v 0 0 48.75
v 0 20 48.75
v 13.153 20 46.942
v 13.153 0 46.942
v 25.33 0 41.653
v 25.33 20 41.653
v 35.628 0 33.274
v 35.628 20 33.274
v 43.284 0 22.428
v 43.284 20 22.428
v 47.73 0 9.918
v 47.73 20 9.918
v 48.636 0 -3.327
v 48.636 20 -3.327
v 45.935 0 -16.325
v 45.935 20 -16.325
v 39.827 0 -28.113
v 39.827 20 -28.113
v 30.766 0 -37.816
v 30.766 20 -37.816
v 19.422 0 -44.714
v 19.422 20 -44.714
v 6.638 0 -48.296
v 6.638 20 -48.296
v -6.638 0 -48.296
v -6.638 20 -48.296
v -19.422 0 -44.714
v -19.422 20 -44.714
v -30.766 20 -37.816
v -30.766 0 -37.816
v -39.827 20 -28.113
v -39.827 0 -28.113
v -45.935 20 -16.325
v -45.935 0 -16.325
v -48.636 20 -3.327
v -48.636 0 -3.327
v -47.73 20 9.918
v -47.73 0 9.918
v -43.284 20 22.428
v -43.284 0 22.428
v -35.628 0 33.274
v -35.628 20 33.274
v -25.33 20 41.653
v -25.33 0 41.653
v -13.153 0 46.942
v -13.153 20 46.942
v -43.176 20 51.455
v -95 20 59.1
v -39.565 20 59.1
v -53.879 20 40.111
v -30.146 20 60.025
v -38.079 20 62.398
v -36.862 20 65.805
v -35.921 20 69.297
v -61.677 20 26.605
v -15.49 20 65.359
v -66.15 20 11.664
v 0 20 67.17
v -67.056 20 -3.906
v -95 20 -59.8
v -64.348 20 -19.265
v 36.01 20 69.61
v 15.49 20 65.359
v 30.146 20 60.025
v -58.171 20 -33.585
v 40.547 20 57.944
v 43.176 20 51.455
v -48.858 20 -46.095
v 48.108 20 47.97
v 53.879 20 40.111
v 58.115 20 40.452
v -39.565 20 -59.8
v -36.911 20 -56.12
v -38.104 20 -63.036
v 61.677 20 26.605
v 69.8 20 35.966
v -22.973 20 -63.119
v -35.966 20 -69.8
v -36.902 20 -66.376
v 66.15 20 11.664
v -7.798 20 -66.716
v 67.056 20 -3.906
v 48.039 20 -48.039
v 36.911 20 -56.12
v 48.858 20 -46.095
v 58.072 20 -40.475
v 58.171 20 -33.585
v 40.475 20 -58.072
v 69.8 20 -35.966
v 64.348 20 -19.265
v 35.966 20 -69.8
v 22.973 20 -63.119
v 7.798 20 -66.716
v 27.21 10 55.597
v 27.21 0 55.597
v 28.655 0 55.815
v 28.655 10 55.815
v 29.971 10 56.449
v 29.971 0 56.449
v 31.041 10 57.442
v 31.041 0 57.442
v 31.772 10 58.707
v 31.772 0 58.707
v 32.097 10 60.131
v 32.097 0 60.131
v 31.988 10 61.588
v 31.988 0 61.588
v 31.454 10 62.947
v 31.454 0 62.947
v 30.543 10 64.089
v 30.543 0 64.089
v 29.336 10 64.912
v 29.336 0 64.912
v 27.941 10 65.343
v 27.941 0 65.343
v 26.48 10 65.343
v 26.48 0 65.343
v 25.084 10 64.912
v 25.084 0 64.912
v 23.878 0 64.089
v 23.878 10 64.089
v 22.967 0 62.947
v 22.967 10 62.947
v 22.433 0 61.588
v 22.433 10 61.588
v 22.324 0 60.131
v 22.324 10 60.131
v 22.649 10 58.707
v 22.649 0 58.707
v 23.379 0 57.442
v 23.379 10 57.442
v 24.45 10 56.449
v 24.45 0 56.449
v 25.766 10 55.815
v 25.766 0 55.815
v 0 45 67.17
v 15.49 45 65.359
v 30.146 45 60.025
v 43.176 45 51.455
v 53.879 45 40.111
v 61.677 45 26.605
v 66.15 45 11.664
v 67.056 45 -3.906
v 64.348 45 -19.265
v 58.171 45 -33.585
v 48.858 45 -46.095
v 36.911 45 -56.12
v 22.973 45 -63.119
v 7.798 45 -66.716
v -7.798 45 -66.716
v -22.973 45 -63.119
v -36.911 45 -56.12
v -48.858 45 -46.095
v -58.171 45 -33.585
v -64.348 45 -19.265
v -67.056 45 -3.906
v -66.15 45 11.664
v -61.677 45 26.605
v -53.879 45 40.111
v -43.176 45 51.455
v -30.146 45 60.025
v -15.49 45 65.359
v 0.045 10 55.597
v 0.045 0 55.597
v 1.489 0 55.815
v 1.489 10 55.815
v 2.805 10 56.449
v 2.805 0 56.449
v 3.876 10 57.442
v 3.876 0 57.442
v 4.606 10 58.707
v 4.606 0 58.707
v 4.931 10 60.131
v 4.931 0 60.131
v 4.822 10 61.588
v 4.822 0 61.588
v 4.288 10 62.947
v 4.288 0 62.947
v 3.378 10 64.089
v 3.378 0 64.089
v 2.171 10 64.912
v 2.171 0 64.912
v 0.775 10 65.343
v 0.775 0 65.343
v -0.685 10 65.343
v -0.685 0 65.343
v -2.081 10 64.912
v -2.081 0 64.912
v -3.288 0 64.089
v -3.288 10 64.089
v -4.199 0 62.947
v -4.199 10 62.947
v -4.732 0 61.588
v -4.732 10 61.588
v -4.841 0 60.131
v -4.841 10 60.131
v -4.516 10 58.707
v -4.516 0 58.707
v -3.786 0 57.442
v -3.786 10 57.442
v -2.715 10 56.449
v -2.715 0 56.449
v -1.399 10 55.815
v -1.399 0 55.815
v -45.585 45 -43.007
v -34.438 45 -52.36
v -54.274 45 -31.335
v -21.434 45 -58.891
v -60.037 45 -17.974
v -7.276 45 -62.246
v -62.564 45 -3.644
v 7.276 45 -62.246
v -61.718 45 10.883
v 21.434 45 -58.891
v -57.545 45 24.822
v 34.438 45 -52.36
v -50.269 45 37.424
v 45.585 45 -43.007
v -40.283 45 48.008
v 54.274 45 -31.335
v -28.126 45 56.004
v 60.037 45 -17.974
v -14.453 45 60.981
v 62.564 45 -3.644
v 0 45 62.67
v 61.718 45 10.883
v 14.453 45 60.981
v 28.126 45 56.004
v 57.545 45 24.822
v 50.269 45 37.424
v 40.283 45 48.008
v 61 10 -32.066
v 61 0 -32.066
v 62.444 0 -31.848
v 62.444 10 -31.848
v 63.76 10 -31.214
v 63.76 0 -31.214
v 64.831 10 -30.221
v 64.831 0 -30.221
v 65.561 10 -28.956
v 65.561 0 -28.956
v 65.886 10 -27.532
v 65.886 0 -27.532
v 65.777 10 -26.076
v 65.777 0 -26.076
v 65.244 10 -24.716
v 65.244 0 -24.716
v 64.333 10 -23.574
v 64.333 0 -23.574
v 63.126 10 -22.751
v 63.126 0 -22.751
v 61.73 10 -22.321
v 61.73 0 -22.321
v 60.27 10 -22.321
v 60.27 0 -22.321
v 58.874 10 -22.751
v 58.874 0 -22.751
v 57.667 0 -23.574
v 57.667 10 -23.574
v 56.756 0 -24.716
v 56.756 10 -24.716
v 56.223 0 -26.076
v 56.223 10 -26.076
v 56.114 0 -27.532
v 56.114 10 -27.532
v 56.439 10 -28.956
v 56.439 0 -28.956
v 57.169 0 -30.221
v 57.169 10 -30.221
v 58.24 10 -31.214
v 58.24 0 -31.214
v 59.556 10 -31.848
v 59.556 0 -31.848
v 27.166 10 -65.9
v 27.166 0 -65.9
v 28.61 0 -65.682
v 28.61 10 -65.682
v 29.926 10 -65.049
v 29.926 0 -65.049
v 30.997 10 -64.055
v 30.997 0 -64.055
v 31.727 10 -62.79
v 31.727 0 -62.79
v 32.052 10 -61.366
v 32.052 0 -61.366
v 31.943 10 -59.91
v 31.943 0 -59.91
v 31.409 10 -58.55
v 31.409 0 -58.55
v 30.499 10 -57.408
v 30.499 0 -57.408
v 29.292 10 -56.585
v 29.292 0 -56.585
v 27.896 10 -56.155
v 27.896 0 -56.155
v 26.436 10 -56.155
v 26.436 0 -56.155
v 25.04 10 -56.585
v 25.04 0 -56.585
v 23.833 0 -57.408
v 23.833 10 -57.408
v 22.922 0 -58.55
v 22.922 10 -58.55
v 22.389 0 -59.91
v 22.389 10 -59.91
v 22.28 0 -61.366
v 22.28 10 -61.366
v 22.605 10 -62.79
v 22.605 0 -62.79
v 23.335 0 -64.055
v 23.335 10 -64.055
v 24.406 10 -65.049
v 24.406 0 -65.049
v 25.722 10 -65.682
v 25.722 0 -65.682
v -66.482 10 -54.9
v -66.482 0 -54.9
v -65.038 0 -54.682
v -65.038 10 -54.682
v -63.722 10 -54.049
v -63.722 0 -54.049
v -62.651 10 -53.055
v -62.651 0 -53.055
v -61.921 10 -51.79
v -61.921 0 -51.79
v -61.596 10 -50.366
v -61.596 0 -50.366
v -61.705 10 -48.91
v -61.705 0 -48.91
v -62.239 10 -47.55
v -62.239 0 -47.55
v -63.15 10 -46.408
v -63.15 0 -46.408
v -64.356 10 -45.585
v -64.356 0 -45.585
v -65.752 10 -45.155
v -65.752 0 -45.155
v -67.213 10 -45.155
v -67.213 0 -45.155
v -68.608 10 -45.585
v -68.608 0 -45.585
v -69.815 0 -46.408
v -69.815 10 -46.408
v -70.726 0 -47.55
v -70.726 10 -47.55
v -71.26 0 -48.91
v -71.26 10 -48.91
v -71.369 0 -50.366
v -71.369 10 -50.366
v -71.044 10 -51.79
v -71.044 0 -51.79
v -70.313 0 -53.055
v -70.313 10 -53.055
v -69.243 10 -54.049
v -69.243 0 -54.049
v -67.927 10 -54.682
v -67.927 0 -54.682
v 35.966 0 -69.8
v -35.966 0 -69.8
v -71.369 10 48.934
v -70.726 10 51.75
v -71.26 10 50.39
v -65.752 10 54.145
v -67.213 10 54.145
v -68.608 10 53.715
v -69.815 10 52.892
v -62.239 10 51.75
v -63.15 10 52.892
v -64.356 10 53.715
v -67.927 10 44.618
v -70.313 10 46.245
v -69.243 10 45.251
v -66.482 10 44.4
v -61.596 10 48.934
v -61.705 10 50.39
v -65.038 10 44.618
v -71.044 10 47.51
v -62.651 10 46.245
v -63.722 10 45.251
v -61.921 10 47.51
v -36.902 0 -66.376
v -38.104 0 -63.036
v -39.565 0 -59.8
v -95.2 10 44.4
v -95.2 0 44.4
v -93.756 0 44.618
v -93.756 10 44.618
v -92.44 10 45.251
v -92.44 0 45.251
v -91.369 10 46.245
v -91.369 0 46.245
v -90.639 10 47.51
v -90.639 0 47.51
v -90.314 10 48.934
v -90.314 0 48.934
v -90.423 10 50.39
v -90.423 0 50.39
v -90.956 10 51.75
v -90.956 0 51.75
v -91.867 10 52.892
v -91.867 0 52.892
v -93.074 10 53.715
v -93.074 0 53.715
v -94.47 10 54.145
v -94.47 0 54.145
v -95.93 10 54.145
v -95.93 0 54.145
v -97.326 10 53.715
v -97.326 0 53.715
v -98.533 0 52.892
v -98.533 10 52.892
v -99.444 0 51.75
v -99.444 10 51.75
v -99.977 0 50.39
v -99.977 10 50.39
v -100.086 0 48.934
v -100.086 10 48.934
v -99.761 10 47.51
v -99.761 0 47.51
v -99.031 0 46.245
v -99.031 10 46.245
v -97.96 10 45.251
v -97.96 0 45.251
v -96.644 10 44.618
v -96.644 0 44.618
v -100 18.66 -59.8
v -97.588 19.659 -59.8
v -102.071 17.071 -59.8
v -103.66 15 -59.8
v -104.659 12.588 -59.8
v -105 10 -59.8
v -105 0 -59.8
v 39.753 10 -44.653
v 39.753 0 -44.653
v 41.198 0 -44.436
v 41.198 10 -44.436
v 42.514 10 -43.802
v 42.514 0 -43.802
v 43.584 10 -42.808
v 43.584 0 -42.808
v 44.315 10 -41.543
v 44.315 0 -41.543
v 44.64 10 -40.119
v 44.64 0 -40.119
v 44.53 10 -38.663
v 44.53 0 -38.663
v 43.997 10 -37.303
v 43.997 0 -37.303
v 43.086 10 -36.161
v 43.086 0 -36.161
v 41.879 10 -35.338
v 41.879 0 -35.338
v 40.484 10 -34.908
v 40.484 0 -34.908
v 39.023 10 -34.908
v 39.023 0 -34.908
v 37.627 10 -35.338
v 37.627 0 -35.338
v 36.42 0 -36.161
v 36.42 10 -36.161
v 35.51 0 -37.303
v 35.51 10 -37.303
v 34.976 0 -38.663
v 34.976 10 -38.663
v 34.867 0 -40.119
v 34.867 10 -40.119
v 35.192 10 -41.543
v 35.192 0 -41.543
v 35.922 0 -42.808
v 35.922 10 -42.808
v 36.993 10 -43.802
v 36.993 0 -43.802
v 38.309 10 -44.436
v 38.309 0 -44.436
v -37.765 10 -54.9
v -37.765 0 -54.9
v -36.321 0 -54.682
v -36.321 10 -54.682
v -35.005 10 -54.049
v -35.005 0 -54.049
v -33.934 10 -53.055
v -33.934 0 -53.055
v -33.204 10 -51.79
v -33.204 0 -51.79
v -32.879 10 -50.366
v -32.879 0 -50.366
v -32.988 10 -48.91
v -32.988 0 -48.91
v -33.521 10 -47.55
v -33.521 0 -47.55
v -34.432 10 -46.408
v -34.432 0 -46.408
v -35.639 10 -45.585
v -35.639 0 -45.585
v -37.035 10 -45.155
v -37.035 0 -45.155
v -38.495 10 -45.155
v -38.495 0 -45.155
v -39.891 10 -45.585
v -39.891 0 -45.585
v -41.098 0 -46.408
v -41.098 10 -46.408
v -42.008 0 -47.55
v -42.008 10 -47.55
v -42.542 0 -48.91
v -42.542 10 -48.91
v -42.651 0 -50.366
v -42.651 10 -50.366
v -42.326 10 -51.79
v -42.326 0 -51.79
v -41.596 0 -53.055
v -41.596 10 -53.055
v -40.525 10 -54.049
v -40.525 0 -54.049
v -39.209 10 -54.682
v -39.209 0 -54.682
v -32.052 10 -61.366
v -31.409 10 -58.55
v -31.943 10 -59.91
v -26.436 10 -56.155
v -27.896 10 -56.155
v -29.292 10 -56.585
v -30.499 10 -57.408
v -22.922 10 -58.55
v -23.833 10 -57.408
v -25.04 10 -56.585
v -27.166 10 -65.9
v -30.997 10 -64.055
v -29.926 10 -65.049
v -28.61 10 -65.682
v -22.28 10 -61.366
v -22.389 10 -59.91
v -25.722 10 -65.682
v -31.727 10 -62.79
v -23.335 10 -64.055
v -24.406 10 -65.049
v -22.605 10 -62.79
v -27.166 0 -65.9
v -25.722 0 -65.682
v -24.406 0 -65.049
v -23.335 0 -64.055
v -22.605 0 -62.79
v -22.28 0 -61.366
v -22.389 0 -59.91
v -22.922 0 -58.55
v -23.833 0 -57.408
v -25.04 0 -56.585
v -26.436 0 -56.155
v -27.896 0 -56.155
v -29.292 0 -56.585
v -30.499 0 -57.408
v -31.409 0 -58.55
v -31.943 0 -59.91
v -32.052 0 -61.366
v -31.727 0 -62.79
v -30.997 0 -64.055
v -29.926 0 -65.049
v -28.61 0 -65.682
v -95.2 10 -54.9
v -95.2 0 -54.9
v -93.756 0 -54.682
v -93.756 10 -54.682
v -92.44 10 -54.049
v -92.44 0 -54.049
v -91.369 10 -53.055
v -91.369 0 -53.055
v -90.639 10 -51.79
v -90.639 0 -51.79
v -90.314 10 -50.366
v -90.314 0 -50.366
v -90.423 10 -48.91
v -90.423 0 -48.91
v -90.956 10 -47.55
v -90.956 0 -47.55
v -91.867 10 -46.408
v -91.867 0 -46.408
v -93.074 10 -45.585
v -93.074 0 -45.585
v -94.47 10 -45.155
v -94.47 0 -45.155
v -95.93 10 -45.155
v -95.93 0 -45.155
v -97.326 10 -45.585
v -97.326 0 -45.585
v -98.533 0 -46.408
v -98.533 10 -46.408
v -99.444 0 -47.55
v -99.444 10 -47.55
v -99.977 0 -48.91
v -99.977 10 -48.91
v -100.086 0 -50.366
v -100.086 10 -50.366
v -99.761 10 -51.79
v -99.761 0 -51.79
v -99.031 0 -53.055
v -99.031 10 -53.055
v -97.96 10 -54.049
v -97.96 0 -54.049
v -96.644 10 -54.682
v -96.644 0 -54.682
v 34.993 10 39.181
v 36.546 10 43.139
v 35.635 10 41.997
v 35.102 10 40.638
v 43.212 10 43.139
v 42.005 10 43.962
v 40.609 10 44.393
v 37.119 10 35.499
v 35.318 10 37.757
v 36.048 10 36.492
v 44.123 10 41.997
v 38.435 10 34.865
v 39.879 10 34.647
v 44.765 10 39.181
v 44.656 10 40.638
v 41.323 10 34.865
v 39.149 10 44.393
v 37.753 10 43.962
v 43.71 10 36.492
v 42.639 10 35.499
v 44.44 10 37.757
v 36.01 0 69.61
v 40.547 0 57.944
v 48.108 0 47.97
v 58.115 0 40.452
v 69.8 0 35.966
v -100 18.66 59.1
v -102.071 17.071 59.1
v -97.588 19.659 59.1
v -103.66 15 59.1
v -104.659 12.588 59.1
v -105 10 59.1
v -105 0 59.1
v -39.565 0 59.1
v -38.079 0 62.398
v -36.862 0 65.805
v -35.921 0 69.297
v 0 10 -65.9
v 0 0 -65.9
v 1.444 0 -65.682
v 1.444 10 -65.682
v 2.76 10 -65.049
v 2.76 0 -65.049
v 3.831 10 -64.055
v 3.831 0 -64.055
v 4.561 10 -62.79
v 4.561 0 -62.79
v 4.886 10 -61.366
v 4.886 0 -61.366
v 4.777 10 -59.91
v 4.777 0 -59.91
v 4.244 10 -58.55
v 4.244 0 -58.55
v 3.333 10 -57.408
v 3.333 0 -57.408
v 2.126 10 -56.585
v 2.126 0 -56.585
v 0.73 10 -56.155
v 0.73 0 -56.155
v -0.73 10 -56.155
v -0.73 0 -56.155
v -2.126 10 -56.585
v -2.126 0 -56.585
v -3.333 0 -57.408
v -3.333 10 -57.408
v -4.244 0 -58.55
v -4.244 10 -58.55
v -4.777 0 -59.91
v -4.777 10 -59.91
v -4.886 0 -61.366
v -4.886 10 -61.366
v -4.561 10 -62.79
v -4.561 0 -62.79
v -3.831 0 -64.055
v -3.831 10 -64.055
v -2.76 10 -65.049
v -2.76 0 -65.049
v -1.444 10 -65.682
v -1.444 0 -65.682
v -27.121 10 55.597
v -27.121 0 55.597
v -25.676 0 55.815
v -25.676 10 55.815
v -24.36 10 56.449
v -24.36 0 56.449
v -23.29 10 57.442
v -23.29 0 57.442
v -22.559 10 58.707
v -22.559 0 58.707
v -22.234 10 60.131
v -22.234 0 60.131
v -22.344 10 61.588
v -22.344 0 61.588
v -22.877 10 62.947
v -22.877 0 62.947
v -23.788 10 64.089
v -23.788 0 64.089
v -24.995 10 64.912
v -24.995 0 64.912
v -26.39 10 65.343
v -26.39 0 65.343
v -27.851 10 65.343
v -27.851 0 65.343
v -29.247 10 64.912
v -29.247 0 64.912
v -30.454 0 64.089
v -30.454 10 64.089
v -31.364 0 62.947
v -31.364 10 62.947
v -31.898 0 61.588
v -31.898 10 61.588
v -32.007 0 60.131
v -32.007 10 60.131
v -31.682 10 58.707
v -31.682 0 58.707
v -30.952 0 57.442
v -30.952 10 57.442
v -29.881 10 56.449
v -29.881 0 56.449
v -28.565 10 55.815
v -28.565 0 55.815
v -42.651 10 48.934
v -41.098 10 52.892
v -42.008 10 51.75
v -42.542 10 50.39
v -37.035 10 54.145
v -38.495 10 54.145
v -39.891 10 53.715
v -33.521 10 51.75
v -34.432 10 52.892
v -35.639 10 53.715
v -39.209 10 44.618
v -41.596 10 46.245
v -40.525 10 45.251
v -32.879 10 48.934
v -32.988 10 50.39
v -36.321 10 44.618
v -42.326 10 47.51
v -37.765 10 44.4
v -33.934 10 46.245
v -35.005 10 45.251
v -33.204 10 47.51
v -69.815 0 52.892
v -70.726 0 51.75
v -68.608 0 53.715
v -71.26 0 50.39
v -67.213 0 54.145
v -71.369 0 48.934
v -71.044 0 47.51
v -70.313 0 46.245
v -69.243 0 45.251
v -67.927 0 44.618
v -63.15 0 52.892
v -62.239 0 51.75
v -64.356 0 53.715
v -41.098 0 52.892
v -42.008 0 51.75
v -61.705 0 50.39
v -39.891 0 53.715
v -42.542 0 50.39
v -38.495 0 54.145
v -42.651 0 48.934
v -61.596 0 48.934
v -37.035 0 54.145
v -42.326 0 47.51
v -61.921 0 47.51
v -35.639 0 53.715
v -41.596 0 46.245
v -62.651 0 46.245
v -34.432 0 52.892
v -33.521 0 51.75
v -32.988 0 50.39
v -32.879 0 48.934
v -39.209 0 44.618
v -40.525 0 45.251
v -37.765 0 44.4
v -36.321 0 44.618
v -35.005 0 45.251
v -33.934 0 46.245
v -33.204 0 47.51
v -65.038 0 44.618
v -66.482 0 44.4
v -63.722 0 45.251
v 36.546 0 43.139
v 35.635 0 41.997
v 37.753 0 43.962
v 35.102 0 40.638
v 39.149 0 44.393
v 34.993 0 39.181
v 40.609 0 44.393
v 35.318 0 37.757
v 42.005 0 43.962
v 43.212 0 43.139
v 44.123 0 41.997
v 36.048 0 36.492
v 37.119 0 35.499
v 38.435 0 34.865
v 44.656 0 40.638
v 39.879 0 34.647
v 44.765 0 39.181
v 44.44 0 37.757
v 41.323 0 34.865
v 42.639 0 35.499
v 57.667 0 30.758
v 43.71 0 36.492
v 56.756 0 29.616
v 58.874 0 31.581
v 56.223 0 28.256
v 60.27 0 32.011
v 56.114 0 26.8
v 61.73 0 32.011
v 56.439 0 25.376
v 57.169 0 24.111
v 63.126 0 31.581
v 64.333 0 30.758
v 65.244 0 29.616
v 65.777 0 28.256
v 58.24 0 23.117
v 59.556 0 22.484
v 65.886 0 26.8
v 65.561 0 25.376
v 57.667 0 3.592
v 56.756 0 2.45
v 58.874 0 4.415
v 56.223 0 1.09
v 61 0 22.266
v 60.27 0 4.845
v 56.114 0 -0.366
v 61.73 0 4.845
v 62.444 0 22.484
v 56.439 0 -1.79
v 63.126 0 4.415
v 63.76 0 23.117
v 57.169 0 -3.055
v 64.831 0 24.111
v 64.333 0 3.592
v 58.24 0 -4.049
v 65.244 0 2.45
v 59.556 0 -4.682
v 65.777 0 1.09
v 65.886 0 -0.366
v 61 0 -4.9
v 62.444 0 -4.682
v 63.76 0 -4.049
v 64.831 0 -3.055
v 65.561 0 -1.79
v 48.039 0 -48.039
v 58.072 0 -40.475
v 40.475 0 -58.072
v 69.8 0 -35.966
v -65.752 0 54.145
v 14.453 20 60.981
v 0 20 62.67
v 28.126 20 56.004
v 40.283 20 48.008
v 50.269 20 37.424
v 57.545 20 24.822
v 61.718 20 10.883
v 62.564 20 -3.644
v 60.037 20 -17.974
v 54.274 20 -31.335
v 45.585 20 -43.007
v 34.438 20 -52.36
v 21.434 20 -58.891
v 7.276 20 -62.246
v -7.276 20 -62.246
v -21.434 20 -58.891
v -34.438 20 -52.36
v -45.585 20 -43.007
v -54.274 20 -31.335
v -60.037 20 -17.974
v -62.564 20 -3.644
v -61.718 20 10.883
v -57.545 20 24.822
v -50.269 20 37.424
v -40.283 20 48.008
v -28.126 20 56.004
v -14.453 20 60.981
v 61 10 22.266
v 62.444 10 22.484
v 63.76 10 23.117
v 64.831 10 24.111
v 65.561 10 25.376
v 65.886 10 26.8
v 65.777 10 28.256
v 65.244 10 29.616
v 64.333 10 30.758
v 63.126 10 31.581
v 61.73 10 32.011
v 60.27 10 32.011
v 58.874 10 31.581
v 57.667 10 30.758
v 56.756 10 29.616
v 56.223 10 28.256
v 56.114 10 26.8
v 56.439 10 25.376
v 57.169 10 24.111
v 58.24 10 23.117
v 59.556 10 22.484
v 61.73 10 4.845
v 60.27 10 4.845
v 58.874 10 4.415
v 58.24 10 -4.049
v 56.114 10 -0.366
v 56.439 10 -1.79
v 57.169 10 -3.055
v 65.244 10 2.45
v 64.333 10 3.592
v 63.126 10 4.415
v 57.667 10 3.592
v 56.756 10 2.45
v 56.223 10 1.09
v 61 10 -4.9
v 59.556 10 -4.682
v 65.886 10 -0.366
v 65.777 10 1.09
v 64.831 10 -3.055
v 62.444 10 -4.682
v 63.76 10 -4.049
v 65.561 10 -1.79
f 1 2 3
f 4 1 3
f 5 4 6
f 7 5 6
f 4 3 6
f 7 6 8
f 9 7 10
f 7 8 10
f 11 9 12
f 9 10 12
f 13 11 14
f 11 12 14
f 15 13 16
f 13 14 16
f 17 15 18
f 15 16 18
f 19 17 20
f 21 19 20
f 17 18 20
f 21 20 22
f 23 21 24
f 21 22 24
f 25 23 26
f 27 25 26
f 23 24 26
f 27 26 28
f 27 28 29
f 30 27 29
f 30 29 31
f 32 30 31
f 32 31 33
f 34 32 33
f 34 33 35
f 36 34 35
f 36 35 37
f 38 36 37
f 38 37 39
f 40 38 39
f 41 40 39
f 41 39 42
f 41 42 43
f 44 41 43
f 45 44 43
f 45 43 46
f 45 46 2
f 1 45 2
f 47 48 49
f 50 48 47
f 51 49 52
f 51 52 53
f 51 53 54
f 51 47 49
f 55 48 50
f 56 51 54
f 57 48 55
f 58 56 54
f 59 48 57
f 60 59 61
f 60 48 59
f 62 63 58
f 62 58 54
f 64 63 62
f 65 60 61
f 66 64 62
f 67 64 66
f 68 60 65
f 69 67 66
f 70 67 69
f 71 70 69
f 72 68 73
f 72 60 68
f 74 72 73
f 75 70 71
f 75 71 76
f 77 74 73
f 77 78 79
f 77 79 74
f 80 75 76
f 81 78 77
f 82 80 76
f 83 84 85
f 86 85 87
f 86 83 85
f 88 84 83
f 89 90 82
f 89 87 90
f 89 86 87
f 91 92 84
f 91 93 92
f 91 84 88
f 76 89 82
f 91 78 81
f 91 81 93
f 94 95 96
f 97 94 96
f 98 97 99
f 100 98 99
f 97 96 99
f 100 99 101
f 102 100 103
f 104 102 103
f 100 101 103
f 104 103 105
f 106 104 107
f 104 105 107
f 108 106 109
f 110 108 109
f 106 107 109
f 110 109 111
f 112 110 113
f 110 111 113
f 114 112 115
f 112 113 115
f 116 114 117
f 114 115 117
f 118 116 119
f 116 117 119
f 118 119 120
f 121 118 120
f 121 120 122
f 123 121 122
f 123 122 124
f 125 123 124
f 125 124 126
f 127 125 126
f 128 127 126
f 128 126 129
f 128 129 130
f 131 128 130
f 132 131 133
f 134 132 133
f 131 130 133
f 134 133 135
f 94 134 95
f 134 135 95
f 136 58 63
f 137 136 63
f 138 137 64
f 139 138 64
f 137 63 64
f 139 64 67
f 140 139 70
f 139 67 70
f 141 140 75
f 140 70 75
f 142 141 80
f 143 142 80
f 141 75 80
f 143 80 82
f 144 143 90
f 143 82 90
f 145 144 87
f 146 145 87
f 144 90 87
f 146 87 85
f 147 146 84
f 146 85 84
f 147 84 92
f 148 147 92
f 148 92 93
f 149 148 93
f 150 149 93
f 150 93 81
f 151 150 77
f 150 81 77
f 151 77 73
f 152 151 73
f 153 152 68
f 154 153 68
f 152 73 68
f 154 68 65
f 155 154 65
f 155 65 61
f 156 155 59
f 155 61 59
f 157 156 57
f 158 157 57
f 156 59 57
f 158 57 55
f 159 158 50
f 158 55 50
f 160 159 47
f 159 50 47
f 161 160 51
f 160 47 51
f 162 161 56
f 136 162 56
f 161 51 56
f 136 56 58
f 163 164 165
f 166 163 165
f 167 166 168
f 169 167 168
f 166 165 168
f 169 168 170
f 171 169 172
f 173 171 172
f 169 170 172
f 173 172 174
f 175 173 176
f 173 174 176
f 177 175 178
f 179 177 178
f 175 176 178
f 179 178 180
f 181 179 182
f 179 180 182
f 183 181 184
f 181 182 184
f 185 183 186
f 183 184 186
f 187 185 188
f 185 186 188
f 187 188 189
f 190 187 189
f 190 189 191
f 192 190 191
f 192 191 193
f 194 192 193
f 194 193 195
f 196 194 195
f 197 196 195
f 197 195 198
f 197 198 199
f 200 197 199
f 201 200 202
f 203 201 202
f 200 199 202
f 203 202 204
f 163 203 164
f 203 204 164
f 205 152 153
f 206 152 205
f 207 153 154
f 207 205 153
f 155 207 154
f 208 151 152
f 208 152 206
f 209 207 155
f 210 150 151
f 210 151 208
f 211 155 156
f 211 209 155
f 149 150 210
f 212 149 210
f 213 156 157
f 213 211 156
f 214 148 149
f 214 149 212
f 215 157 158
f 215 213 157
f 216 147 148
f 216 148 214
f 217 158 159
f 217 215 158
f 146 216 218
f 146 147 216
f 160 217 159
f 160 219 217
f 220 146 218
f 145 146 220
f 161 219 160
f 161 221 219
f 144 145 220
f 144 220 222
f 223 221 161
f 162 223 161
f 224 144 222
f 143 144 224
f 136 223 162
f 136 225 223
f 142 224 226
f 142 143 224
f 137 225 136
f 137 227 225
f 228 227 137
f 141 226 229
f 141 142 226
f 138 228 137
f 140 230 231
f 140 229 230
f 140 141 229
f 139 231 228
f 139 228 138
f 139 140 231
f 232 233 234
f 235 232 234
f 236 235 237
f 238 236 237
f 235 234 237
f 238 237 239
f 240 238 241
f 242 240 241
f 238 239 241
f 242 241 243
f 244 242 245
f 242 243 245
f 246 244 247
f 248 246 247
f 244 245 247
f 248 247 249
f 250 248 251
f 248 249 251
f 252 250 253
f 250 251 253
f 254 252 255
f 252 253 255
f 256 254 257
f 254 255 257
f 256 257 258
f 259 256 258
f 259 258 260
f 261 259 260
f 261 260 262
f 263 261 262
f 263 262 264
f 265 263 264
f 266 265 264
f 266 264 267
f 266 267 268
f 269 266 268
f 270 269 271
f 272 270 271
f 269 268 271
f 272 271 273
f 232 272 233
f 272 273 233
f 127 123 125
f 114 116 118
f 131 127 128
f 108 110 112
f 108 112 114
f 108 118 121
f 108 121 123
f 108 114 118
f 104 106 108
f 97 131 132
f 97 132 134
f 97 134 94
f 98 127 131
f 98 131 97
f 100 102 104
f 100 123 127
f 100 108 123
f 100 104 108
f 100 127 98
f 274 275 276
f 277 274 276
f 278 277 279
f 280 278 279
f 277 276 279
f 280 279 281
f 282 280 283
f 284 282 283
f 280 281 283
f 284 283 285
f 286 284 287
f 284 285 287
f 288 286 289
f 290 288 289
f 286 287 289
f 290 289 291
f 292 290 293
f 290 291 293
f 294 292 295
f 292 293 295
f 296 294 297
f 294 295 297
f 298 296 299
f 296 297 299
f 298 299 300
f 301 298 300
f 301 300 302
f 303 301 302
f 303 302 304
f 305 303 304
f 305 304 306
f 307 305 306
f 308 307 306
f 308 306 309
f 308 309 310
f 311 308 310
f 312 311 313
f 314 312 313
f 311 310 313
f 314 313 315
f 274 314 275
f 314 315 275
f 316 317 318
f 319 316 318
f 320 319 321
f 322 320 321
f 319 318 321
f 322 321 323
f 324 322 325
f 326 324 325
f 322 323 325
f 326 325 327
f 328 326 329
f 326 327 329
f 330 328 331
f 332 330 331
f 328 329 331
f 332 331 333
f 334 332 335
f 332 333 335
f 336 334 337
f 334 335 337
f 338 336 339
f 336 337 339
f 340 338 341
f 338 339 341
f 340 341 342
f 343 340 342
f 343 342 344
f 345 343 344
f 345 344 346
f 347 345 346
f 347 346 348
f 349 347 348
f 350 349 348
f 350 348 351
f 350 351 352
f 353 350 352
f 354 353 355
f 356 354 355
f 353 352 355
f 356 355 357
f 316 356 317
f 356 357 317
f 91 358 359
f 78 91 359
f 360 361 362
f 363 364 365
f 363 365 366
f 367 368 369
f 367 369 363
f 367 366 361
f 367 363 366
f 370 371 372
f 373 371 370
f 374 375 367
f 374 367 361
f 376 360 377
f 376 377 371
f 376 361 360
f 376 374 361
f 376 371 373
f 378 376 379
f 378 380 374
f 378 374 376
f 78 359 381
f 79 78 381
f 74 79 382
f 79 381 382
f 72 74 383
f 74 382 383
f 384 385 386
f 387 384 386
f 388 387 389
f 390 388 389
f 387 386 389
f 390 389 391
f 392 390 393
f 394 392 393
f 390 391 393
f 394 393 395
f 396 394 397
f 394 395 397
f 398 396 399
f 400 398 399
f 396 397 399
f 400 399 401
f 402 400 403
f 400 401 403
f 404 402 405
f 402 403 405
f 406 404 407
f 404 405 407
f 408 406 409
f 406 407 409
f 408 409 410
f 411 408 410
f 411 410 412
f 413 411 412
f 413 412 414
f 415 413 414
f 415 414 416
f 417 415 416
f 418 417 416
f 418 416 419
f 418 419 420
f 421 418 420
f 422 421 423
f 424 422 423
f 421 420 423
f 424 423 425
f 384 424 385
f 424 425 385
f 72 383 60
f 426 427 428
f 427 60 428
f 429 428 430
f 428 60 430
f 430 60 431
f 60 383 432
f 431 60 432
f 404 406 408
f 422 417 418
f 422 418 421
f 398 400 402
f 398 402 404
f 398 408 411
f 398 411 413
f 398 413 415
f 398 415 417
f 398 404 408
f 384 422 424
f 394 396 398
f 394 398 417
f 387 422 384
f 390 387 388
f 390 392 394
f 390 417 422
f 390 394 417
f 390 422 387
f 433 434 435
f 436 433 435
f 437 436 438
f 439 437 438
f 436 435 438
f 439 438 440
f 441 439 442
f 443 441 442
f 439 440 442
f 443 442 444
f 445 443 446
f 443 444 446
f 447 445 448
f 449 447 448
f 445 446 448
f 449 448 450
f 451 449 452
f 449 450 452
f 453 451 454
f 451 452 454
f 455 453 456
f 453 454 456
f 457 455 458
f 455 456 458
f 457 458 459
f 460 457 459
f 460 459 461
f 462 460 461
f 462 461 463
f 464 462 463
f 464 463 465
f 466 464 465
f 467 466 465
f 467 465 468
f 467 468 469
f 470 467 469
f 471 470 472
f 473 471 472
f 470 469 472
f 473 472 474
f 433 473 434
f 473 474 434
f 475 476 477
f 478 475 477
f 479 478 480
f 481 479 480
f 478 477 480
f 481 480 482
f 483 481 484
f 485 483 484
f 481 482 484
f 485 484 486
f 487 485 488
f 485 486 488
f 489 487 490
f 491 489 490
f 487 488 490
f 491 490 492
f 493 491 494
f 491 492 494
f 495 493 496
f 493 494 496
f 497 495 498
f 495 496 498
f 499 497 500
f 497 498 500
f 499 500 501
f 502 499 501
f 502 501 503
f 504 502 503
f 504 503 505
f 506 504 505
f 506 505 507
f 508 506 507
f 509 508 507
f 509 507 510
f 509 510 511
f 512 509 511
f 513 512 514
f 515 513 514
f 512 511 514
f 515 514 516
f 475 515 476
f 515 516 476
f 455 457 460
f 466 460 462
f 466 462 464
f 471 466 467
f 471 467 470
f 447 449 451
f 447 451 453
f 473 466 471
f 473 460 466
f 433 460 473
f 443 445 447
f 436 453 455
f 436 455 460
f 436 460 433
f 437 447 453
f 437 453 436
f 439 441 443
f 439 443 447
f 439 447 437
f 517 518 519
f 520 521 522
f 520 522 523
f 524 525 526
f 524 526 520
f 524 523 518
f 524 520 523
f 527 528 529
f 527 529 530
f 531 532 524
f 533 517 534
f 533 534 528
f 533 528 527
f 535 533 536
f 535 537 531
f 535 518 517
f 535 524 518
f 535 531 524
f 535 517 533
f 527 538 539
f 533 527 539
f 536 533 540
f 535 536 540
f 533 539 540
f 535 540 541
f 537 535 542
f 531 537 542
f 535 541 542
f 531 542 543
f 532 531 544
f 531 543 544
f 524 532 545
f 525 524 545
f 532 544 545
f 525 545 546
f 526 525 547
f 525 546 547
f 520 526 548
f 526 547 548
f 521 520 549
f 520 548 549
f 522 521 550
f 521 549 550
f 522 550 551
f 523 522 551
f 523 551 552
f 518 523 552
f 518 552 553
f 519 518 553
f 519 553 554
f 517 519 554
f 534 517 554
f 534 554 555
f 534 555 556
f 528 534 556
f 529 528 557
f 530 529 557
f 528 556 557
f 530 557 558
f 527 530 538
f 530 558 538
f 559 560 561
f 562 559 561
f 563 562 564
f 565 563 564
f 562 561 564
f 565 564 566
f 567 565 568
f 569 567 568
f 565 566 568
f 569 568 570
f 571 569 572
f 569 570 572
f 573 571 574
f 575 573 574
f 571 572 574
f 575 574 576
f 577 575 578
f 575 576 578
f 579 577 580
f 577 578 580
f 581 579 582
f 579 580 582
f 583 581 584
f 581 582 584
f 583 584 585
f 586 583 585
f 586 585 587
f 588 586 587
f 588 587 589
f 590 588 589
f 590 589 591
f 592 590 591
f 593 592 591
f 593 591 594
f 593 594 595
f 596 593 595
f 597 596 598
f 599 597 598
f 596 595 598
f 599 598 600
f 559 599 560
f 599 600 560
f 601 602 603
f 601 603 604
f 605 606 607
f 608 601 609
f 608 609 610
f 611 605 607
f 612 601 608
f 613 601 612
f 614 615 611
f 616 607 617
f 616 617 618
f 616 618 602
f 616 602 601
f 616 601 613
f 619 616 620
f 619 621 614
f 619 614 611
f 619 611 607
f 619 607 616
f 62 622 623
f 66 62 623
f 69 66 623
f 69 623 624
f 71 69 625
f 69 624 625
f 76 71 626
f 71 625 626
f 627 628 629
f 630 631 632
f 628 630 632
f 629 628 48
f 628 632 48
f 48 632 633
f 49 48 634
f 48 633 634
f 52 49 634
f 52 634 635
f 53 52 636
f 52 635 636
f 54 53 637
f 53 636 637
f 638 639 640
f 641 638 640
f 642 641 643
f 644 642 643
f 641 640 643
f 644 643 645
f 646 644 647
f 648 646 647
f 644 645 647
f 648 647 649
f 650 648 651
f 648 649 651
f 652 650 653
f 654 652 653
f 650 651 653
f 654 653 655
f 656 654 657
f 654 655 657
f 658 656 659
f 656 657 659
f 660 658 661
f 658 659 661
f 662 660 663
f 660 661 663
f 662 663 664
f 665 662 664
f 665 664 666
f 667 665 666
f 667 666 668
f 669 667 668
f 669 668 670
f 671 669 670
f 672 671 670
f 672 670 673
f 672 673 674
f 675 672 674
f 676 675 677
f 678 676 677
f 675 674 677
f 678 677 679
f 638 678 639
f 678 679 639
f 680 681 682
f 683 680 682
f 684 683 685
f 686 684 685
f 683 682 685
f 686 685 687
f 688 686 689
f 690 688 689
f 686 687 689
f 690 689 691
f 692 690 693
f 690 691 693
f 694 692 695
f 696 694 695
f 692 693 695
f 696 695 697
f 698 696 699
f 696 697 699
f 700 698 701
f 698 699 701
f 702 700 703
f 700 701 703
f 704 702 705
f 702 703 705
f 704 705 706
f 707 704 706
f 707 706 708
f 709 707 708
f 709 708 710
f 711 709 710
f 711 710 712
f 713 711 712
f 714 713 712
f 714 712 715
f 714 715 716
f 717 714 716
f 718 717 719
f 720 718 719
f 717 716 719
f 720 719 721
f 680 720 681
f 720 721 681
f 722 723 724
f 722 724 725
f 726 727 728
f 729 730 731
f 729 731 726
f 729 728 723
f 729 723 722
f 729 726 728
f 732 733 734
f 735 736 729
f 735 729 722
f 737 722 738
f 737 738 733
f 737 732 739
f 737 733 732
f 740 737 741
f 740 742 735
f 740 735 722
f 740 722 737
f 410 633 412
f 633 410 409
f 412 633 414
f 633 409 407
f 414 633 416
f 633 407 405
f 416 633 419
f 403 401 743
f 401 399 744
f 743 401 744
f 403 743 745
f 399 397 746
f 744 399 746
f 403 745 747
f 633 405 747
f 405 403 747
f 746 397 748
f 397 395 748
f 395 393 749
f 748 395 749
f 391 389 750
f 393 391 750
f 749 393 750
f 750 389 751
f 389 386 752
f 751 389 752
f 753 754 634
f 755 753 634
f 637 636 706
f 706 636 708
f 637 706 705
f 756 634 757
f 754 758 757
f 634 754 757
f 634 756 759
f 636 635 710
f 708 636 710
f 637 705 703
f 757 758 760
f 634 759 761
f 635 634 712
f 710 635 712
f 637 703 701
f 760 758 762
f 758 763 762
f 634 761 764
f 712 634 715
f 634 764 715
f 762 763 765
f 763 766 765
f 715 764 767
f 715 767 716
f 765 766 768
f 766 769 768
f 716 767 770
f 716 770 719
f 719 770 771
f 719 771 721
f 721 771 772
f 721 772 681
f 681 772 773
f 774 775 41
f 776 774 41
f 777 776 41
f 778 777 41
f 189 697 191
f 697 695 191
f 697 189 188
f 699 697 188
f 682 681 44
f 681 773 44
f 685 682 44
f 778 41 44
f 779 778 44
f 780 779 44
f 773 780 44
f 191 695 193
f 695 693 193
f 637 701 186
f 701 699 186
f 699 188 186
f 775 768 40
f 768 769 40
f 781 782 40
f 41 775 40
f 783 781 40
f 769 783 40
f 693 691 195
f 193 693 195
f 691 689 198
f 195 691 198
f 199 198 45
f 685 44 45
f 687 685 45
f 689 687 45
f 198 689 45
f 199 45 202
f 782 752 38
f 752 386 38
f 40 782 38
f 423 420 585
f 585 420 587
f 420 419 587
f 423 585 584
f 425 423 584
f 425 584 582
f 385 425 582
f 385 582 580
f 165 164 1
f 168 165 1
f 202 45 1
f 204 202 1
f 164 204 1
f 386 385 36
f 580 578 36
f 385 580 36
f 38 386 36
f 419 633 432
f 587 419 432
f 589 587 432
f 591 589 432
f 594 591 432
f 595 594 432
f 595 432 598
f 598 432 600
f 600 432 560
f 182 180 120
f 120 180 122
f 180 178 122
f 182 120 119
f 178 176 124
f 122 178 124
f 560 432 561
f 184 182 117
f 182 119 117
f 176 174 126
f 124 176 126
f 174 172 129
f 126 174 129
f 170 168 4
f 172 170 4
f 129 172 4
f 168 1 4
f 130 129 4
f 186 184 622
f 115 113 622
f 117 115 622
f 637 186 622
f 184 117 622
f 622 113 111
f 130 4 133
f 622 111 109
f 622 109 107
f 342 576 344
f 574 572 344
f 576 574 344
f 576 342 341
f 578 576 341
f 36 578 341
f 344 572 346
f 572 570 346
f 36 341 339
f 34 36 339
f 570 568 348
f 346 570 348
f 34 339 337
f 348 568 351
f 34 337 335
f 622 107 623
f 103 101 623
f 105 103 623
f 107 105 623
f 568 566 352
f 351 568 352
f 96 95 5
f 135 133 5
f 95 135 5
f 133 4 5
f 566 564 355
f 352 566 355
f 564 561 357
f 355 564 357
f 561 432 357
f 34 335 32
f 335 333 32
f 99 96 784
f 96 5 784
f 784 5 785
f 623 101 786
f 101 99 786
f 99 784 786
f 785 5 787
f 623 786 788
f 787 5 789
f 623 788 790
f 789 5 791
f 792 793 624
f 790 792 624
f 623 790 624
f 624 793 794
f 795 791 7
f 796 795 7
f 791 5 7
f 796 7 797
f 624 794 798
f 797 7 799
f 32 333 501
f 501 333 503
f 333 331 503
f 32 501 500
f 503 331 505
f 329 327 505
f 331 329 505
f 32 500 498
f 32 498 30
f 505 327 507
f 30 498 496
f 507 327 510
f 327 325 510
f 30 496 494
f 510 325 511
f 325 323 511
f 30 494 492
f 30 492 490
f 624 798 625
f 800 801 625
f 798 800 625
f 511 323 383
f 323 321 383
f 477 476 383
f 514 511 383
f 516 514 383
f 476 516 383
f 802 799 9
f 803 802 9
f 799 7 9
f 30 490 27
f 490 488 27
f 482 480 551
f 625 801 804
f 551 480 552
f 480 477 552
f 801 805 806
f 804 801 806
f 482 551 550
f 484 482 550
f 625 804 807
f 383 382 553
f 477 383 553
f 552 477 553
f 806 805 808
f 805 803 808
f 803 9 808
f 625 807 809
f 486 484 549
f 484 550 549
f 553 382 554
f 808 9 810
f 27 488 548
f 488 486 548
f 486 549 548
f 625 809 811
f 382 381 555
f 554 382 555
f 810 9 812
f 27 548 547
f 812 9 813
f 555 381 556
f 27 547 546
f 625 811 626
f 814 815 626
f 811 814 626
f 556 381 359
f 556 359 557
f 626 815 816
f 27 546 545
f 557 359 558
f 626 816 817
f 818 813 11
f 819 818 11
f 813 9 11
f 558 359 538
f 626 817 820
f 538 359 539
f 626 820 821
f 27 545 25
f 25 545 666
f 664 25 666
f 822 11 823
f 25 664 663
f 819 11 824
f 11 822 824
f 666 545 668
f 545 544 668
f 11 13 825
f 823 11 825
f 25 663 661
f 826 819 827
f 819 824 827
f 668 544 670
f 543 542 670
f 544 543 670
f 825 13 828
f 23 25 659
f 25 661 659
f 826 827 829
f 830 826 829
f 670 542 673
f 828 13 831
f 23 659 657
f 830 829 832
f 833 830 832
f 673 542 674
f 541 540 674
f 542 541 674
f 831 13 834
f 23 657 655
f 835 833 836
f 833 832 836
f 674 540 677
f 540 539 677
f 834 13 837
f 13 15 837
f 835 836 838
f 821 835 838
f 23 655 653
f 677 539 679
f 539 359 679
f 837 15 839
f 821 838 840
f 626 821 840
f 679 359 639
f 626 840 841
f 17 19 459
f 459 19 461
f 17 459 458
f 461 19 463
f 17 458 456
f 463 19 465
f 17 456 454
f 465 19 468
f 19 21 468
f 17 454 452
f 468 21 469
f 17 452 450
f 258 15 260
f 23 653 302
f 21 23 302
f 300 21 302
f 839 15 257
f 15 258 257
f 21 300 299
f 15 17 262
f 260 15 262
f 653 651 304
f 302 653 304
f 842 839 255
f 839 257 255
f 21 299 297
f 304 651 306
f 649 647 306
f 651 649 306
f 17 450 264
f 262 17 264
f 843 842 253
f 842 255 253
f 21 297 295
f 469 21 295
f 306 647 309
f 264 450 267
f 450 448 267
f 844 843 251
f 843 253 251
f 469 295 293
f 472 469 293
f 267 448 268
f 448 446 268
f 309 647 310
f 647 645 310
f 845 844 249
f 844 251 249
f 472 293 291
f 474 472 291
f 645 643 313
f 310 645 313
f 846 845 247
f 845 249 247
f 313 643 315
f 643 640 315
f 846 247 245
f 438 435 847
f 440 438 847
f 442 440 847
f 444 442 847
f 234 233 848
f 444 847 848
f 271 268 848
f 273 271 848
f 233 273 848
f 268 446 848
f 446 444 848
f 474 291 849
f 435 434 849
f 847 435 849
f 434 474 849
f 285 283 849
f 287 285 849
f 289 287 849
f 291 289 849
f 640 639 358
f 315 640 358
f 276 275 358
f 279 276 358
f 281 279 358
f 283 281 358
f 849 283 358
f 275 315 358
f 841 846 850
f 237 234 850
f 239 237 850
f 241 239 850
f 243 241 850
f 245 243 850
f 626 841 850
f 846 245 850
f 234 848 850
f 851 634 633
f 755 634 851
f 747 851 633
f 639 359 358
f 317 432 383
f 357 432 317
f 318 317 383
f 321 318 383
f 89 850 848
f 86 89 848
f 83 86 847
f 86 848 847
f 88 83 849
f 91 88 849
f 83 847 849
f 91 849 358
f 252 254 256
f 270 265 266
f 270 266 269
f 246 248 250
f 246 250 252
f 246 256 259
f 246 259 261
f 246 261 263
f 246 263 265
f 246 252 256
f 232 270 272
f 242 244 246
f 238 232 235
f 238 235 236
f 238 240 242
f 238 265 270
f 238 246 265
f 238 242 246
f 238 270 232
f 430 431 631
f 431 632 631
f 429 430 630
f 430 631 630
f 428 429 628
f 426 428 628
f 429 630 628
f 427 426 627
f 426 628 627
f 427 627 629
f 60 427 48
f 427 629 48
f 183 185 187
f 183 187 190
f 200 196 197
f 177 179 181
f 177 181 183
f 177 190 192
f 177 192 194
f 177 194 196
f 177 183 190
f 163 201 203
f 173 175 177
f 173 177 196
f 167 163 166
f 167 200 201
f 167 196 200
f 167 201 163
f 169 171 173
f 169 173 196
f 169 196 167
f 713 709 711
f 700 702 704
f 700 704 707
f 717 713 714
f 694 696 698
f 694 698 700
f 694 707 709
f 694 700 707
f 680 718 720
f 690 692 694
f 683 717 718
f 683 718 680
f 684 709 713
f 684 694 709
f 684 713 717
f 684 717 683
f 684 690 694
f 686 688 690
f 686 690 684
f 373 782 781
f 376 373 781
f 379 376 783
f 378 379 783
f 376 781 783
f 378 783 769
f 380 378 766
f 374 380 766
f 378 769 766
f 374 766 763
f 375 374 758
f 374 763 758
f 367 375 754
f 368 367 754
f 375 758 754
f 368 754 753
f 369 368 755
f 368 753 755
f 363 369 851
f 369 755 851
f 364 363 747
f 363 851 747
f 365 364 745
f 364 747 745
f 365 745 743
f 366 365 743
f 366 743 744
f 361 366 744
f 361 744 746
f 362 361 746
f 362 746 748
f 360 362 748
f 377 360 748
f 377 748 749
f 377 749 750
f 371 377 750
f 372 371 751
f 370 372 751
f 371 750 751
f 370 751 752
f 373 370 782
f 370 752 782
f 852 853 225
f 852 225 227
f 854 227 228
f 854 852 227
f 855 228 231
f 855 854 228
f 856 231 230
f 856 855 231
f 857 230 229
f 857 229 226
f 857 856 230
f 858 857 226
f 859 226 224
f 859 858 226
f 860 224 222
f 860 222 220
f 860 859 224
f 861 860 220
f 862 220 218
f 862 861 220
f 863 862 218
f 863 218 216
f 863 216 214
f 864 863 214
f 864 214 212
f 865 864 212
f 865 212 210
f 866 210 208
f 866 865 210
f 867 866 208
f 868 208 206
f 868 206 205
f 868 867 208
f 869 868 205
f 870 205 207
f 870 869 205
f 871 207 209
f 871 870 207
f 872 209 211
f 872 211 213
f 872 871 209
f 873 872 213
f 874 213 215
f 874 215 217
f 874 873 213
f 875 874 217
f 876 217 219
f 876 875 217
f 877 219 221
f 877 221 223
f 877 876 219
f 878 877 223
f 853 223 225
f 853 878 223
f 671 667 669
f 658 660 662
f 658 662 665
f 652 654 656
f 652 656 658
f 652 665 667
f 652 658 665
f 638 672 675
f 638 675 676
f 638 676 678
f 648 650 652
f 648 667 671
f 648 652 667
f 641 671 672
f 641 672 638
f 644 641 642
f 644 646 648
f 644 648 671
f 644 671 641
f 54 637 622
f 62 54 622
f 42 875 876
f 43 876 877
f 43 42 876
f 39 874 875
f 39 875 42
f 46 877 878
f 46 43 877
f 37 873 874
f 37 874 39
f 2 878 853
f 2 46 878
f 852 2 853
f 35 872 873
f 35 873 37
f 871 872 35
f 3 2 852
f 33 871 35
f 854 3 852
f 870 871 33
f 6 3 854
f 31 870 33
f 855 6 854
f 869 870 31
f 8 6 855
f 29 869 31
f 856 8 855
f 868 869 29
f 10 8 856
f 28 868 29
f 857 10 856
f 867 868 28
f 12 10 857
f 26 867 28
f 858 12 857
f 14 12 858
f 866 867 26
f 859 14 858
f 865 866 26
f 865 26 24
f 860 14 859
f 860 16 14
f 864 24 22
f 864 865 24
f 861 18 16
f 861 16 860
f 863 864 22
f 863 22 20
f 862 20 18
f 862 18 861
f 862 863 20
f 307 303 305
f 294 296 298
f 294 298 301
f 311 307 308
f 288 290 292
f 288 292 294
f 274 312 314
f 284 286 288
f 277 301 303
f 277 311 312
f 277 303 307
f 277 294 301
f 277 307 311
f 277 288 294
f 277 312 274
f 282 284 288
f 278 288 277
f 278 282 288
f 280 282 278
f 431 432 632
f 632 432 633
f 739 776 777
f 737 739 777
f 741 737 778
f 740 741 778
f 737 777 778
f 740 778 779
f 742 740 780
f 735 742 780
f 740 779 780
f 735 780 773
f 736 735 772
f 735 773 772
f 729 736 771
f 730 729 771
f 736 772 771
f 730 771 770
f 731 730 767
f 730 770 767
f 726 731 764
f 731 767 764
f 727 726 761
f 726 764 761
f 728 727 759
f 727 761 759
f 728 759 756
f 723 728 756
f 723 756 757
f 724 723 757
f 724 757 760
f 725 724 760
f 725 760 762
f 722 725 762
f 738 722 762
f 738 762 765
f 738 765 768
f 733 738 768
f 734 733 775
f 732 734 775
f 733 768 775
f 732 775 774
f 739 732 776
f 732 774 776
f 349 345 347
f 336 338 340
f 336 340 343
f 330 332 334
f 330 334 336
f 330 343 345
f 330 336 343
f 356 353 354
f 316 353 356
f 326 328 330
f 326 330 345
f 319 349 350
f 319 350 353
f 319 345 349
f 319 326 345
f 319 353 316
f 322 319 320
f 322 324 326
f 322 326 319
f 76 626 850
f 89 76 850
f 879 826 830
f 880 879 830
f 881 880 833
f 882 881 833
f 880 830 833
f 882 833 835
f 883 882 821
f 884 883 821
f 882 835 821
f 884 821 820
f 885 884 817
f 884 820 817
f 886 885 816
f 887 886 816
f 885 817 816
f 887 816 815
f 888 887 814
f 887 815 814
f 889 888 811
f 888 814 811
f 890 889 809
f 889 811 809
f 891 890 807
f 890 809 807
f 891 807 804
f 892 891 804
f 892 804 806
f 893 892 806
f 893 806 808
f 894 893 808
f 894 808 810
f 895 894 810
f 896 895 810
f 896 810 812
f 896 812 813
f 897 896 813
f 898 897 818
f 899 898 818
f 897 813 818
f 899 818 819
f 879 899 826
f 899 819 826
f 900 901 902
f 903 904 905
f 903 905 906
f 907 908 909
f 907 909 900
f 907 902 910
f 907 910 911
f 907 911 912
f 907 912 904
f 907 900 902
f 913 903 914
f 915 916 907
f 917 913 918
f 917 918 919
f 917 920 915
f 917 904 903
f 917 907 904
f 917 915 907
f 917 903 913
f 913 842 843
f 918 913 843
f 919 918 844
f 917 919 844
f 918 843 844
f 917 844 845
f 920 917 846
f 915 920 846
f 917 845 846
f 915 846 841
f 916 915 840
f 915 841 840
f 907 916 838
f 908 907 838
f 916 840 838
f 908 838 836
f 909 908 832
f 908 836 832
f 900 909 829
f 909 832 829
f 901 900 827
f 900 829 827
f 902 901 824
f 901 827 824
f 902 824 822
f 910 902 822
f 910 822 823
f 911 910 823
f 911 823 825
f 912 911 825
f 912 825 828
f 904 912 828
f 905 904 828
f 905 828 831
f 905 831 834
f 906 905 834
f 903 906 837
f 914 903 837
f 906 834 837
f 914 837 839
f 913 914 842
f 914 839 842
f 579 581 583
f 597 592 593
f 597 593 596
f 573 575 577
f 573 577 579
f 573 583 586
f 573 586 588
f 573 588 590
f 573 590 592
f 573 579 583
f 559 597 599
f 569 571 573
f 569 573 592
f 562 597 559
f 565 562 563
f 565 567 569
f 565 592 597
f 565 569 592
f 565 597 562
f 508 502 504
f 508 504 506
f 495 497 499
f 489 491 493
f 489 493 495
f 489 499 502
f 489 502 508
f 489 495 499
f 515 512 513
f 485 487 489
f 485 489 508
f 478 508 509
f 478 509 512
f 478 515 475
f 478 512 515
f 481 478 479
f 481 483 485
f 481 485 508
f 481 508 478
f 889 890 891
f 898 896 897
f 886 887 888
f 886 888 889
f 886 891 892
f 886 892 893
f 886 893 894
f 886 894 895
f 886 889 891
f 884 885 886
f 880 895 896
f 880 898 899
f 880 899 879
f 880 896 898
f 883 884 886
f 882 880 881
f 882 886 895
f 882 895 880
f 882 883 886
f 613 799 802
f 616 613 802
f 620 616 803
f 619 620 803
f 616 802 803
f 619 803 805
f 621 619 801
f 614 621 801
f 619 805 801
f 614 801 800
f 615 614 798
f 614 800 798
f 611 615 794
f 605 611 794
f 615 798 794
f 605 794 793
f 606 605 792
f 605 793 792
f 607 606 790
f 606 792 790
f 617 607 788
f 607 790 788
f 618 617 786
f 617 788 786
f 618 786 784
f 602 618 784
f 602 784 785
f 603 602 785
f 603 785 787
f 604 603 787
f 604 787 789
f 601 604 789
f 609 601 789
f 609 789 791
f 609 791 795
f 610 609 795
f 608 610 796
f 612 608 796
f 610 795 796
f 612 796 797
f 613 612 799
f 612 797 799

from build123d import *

# Parameters (mm, degrees)
SALIENTE_EXTRUIR4_DEPTH = 20
REDONDEO1_R             = 10
CROQUIS4_3_R            = 4.9
CORTAR_EXTRUIR3_DEPTH   = 10
CROQUIS7_R              = 67.17
CROQUIS7_R_2            = 62.67
SALIENTE_EXTRUIR7_DEPTH = 25
CROQUIS8_R              = 48.75
CORTAR_EXTRUIR4_DEPTH   = 129.538087741


with BuildPart() as part:
    # Croquis2 → Saliente-Extruir4 (new body)
    with BuildSketch(Plane(origin=(0, 0, 0), x_dir=(1, 0, 0), z_dir=(0, 1, 0))):
        with BuildLine():
            Line((-105, 59.8), (-105, -59.1))
            Line((-105, -59.1), (-39.564866762, -59.1))
            ThreePointArc((-39.564866762, -59.1), (-37.4362836, -64.089147092), (-35.920673767, -69.297350411))
            Line((-35.920673767, -69.297350411), (36.010468241, -69.60956711))
            ThreePointArc((36.010468241, -69.60956711), (48.107993991, -47.969702582), (69.8, -35.965922287))
            Line((69.8, -35.965922287), (69.8, 35.965922287))
            ThreePointArc((69.8, 35.965922287), (48.03877349, 48.03877349), (35.965922287, 69.8))
            Line((35.965922287, 69.8), (-35.965922287, 69.8))
            ThreePointArc((-35.965922287, 69.8), (-37.470458506, 64.693854165), (-39.564866762, 59.8))
            Line((-39.564866762, 59.8), (-105, 59.8))
        make_face()
    extrude(amount=SALIENTE_EXTRUIR4_DEPTH)

    # Redondeo1
    redondeo1_edges = [part.edges().sort_by_distance(p)[0] for p in [
        (-105, 20, -0.35),
    ]]
    fillet(redondeo1_edges, radius=REDONDEO1_R)

    # Croquis4<3> → Cortar-Extruir3 (cut)
    with BuildSketch(Plane.XZ):
        with Locations((-95.2, 49.3)):
            Circle(CROQUIS4_3_R)
        with Locations((-66.482433381, 49.3)):
            Circle(CROQUIS4_3_R)
        with Locations((-37.764866762, 49.3)):
            Circle(CROQUIS4_3_R)
        with Locations((-27.120673767, 60.497350411)):
            Circle(CROQUIS4_3_R)
        with Locations((0.044897237, 60.497350411)):
            Circle(CROQUIS4_3_R)
        with Locations((27.210468241, 60.497350411)):
            Circle(CROQUIS4_3_R)
        with Locations((61, 27.165922287)):
            Circle(CROQUIS4_3_R)
        with Locations((39.878985668, 39.547302783)):
            Circle(CROQUIS4_3_R)
        with Locations((61, 0)):
            Circle(CROQUIS4_3_R)
        with Locations((61, -27.165922287)):
            Circle(CROQUIS4_3_R)
        with Locations((27.165922287, -61)):
            Circle(CROQUIS4_3_R)
        with Locations((39.753243225, -39.753243225)):
            Circle(CROQUIS4_3_R)
        with Locations((0, -61)):
            Circle(CROQUIS4_3_R)
        with Locations((-27.165922287, -61)):
            Circle(CROQUIS4_3_R)
        with Locations((-37.764866762, -50)):
            Circle(CROQUIS4_3_R)
        with Locations((-66.482433381, -50)):
            Circle(CROQUIS4_3_R)
        with Locations((-95.2, -50)):
            Circle(CROQUIS4_3_R)
    extrude(amount=-CORTAR_EXTRUIR3_DEPTH, mode=Mode.SUBTRACT)

    # Croquis7 → Saliente-Extruir7 (add)
    with BuildSketch(Plane(origin=(0, 20, 0), x_dir=(1, 0, 0), z_dir=(0, 1, 0))):
        Circle(CROQUIS7_R)
        Circle(CROQUIS7_R_2, mode=Mode.SUBTRACT)
    extrude(amount=SALIENTE_EXTRUIR7_DEPTH)

    # Croquis8 → Cortar-Extruir4 (cut, through all)
    with BuildSketch(Plane(origin=(0, 20, 0), x_dir=(1, 0, 0), z_dir=(0, 1, 0))):
        Circle(CROQUIS8_R)
    extrude(amount=-CORTAR_EXTRUIR4_DEPTH, mode=Mode.SUBTRACT)


solid = part.part
